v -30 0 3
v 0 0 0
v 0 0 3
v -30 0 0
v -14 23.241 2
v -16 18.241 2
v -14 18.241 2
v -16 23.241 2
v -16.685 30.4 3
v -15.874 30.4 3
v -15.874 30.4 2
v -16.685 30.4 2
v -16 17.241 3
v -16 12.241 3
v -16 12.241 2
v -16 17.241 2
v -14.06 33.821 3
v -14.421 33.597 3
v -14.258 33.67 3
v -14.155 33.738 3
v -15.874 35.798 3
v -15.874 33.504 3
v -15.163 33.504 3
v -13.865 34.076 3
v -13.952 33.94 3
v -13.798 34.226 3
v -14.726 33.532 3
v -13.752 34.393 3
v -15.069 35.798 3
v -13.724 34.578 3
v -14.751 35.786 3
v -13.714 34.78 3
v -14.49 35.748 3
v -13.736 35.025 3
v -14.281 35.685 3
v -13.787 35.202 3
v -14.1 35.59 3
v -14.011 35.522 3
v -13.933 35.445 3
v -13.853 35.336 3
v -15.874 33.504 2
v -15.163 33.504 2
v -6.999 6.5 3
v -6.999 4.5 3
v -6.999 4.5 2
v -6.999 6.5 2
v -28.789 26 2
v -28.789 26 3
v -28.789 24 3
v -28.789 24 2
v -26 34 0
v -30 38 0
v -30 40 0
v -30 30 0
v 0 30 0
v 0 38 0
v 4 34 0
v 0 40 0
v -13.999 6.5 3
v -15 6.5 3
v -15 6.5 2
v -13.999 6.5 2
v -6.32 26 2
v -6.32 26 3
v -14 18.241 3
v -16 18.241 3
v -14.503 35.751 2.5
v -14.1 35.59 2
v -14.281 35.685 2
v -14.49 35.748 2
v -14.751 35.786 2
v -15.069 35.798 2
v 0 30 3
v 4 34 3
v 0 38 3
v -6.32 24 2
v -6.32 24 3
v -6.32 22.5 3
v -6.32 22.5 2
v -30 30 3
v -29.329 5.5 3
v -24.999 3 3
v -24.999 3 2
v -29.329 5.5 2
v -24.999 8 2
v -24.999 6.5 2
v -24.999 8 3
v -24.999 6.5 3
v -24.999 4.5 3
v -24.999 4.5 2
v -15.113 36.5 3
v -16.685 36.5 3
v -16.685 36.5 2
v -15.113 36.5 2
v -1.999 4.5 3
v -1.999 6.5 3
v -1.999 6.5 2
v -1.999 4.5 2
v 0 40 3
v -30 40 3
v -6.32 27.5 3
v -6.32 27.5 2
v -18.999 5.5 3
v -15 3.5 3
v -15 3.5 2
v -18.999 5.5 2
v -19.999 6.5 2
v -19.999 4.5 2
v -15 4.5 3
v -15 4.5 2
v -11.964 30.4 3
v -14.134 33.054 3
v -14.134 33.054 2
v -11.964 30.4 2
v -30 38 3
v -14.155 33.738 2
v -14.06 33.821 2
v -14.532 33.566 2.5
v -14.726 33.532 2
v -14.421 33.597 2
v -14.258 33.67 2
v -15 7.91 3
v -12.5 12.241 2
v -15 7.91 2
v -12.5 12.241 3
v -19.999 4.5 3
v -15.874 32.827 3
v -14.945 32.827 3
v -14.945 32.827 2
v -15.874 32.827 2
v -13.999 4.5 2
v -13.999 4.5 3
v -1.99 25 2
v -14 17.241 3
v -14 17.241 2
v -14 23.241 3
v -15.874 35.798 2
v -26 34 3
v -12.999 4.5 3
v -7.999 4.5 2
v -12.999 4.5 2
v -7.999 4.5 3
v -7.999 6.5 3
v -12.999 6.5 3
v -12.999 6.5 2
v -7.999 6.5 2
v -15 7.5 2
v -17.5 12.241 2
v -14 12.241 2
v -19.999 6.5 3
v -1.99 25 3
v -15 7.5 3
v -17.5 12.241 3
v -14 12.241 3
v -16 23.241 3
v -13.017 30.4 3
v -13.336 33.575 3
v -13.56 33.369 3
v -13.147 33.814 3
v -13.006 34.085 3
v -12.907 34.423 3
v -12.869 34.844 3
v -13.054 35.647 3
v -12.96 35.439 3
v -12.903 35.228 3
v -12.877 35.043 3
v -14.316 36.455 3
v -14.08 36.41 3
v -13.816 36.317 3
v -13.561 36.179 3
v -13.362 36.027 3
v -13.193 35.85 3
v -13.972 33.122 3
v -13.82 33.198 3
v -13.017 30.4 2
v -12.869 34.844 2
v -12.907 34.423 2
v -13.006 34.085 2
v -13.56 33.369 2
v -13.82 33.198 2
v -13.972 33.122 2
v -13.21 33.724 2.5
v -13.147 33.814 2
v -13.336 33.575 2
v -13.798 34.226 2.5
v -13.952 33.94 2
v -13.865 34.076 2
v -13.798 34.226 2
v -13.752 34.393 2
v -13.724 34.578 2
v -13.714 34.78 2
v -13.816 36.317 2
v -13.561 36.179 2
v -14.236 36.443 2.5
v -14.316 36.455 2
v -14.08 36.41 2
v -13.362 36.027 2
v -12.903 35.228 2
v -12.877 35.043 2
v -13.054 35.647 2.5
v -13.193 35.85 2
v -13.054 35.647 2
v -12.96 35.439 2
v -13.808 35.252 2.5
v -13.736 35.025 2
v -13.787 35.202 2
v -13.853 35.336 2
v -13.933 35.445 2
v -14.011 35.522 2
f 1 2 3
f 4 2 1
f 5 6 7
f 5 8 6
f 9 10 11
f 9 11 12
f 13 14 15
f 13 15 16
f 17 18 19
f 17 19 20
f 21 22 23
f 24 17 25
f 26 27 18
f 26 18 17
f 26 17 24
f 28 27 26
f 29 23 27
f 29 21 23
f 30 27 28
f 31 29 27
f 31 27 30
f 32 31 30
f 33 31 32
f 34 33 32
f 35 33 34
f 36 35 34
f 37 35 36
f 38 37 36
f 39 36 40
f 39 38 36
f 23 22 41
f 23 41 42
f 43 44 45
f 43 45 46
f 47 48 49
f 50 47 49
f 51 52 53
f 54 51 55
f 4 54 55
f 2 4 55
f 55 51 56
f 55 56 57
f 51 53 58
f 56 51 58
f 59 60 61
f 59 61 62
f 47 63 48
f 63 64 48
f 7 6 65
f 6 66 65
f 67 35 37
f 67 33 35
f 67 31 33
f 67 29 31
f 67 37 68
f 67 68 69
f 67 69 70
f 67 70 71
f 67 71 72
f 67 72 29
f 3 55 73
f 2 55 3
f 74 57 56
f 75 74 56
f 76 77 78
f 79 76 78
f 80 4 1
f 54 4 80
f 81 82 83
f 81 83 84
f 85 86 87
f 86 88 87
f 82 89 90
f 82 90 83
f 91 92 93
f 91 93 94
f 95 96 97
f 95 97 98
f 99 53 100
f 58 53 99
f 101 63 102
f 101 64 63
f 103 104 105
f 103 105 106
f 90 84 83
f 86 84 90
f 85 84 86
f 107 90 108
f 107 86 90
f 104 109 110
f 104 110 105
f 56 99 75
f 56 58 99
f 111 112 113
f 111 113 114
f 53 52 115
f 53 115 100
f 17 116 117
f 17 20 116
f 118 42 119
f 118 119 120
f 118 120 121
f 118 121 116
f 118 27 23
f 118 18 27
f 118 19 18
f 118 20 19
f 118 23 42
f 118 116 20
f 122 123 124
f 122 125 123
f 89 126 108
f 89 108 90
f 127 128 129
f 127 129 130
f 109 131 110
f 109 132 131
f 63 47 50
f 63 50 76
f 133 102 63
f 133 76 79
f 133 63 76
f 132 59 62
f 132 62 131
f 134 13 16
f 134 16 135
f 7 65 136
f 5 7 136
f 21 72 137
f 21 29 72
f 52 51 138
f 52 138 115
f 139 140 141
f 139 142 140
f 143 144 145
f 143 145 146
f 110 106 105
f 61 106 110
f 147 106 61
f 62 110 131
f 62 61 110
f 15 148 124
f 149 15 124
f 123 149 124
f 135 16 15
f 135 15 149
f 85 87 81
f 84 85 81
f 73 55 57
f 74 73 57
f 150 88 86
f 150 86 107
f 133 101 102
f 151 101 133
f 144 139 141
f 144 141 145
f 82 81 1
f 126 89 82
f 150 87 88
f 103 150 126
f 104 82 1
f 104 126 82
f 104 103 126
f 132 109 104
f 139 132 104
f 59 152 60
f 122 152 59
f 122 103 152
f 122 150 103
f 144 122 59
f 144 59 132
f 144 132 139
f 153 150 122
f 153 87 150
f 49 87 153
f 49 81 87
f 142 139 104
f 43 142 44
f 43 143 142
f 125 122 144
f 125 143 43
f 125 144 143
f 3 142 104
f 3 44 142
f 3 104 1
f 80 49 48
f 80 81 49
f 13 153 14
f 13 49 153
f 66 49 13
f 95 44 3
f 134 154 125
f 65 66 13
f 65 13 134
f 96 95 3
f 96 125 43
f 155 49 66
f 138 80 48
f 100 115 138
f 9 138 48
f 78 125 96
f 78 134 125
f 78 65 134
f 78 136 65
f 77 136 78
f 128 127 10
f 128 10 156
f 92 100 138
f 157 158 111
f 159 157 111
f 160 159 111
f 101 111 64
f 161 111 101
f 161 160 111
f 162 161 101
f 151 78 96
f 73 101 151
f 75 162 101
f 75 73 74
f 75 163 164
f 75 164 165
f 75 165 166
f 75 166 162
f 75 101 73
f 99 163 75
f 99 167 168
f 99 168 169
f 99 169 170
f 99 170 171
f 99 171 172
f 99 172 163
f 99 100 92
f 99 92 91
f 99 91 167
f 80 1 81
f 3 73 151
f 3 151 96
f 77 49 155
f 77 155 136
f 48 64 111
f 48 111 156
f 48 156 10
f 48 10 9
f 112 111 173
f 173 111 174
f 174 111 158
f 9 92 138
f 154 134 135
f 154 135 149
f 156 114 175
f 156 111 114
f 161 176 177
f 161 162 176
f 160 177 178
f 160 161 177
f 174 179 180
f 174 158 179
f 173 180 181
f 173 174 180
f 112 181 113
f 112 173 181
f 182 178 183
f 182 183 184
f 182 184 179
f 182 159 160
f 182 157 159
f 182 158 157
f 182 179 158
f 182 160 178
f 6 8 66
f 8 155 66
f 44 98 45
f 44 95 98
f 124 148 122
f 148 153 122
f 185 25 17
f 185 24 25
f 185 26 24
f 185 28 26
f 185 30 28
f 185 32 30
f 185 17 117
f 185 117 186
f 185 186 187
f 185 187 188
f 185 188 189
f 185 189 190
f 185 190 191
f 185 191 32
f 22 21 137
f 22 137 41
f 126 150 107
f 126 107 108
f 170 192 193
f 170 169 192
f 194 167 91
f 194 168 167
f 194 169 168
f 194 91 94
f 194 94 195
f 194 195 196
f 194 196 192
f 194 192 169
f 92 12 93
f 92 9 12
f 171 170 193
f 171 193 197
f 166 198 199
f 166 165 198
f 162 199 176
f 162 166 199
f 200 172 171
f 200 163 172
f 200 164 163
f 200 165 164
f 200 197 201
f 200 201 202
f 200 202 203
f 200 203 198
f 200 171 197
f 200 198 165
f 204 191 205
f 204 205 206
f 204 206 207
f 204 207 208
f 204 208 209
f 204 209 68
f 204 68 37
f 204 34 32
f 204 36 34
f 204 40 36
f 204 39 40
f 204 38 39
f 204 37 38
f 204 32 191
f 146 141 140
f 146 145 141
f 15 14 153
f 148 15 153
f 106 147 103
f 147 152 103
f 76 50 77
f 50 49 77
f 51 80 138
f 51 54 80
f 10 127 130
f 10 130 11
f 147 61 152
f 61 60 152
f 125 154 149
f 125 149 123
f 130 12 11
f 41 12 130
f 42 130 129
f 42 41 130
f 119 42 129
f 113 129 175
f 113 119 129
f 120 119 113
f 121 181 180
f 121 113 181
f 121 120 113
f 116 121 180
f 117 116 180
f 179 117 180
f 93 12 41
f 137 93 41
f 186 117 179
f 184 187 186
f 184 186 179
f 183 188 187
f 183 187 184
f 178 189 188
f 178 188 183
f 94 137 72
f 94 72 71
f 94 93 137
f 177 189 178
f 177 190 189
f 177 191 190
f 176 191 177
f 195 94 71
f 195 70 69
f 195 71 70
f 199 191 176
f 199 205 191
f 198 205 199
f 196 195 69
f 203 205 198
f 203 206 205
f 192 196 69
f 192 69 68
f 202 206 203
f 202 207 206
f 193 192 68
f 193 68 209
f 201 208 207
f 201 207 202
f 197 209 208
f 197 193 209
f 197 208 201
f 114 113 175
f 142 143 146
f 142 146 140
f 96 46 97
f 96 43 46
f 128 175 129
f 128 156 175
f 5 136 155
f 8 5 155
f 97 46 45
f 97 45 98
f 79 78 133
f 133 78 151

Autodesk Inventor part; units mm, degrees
ref_plane "YZ Plane" through (0, 0, 0) normal (1, 0, 0) x (0, 1, 0)
ref_plane "XZ Plane" through (0, 0, 0) normal (0, 1, 0) x (-1, 0, 0)
ref_plane "XY Plane" through (0, 0, 0) normal (0, 0, 1) x (1, 0, 0)
sketch "Sketch1" plane through (0, 0, 0) normal (0, 0, 1) x (1, 0, 0)
  line L0 (0, 0) -> (-30, 0)
  line L1 (-30, 40) -> (0, 40)
  line L2 (-36.1318, 34) -> (13.8682, 34) construction
  circle A0 centre (0, 34) radius 4 construction
  circle A1 centre (-30, 34) radius 4 construction
  line L3 (-30, 30) -> (0, 30) construction
  line L4 (0, 30) -> (4, 34)
  line L5 (4, 34) -> (0, 38)
  line L6 (-30, 30) -> (-26, 34)
  line L7 (-26, 34) -> (-30, 38)
  line L8 (-30, 0) -> (-30, 30)
  line L9 (-30, 38) -> (-30, 40)
  line L10 (0, 40) -> (0, 38)
  line L11 (0, 30) -> (0, 0)
  dimension "d0" = 30
  dimension "d1" = 40
  dimension "d2" = 50
  dimension "d3" = 6
  dimension "d4" = 8
  dimension "d5" = 8
extrude "Extrusion1" add sketch "Sketch1" along normal blind 3
sketch "Sketch2" plane through (0, 0, 3) normal (0, 0, 1) x (1, 0, 0)
  line L0 (-30, 30) -> (-30, 0) construction
  line L1 (-30, 0) -> (0, 0) construction
  line L2 (0, 0) -> (0, 30) construction
  line L3 (-17.303, 36.5) -> (-11.9002, 36.5) construction
  line L4 (-11.9002, 36.5) -> (-11.9002, 30.2072) construction
  line L5 (-11.9002, 30.2072) -> (-17.303, 30.2072) construction
  line L6 (-17.303, 30.2072) -> (-17.303, 36.5) construction
  line L7 (-28.7886, 24) -> (-6.3197, 24)
  line L8 (-6.3197, 24) -> (-6.3197, 26)
  line L9 (-6.3197, 26) -> (-28.7886, 26)
  line L10 (-30, 25) -> (0, 25) construction
  line L11 (-6.3197, 26) -> (-6.3197, 27.5)
  line L12 (-6.3197, 27.5) -> (-1.9896, 25)
  line L13 (-6.3197, 24) -> (-6.3197, 22.5)
  line L14 (-6.3197, 22.5) -> (-1.9896, 25)
  line L15 (-16, 12.2406) -> (-17.5, 12.2406)
  line L16 (-17.5, 12.2406) -> (-15, 7.9105)
  line L17 (-14, 12.2406) -> (-12.5, 12.2406)
  line L18 (-12.5, 12.2406) -> (-15, 7.9105)
  line L19 (-30, 5.5) -> (0, 5.5) construction
  line L20 (-6.9986, 6.5) -> (-1.9986, 6.5)
  line L21 (-1.9986, 6.5) -> (-1.9986, 4.5)
  line L22 (-1.9986, 4.5) -> (-6.9986, 4.5)
  line L23 (-6.9986, 4.5) -> (-6.9986, 6.5)
  line L24 (-6.9986, 6.5) -> (-1.9986, 4.5) construction
  line L25 (-1.9986, 6.5) -> (-6.9986, 4.5) construction
  line L26 (-1.9896, 25) -> (-1.9896, 0) construction
  line L27 (-12.9986, 6.5) -> (-7.9986, 6.5)
  line L28 (-36, 5.5) -> (-6, 5.5) construction
  line L29 (-7.9986, 4.5) -> (-12.9986, 4.5)
  line L30 (-12.9986, 4.5) -> (-12.9986, 6.5)
  line L31 (-7.9986, 6.5) -> (-7.9986, 4.5)
  line L32 (-18.9986, 6.5) -> (-13.9986, 6.5)
  line L33 (-42, 5.5) -> (-12, 5.5) construction
  line L34 (-13.9986, 4.5) -> (-18.9986, 4.5)
  line L35 (-18.9986, 4.5) -> (-18.9986, 5.4478)
  line L36 (-13.9986, 6.5) -> (-13.9986, 4.5)
  line L37 (-24.9986, 6.5) -> (-19.9986, 6.5)
  line L38 (-48, 5.5) -> (-18, 5.5) construction
  line L39 (-19.9986, 4.5) -> (-24.9986, 4.5)
  line L40 (-24.9986, 4.5) -> (-24.9986, 6.5)
  line L41 (-19.9986, 6.5) -> (-19.9986, 4.5)
  line L42 (-24.9986, 6.5) -> (-24.9986, 8)
  line L43 (-24.9986, 8) -> (-29.3287, 5.5)
  line L44 (-24.9986, 4.5) -> (-24.9986, 3)
  line L45 (-24.9986, 3) -> (-29.3287, 5.5)
  line L46 (-28.7886, 26) -> (-28.7886, 24)
  line L47 (-15, 6.5) -> (-15, 7.5)
  line L48 (-15, 7.5) -> (-18.9986, 5.5)
  line L49 (-15, 4.5) -> (-15, 3.5)
  line L50 (-15, 3.5) -> (-18.9986, 5.5)
  line L51 (-15, 6.5) -> (-13.9986, 6.5)
  line L52 (-13.9986, 6.5) -> (-13.9986, 4.5)
  line L53 (-13.9986, 4.5) -> (-15, 4.5)
  line L54 (-15, -0.4455) -> (-15, 27.9265) construction
  line L55 (-16, 12.2406) -> (-16, 17.2406)
  line L56 (-14, 17.2406) -> (-14, 12.2406)
  line L57 (-16, 18.2406) -> (-14, 18.2406)
  line L58 (-14, 18.2406) -> (-14, 23.2406)
  line L59 (-14, 23.2406) -> (-16, 23.2406)
  line L60 (-16, 23.2406) -> (-16, 18.2406)
  line L61 (-16, 17.2406) -> (-14, 17.2406)
  line L62 (0, 40) -> (-30, 40) construction
  line L63 (-11.9643, 30.4) -> (-13.0172, 30.4)
  line L64 (-13.0172, 30.4) -> (-14.9451, 32.8271)
  line L65 (-14.9451, 32.8271) -> (-15.8744, 32.8271)
  line L66 (-15.8744, 32.8271) -> (-15.8744, 30.4)
  line L67 (-15.8744, 30.4) -> (-16.6851, 30.4)
  line L68 (-16.6851, 30.4) -> (-16.6851, 36.5)
  line L69 (-16.6851, 36.5) -> (-15.1132, 36.5)
  spline S0 degree 2 poles (-15.1132, 36.5) (-14.5892, 36.5) (-13.8823, 36.3863) (-13.561, 36.1787) knots 0 0 0 1 2 2 2
  spline S1 degree 2 poles (-13.561, 36.1787) (-13.2397, 35.9711) (-12.8689, 35.3235) (-12.8689, 34.844) knots 0 0 0 1 2 2 2
  spline S2 degree 2 poles (-12.8689, 34.844) (-12.8689, 34.1767) (-13.5511, 33.272) (-14.1344, 33.0545) knots 0 0 0 1 2 2 2
  line L70 (-14.1344, 33.0545) -> (-11.9643, 30.4)
  spline S3 degree 2 poles (-13.7142, 34.7797) (-13.7142, 35.0467) (-13.9021, 35.457) (-14.0998, 35.5904) knots 0 0 0 1 2 2 2
  spline S4 degree 2 poles (-14.0998, 35.5904) (-14.2728, 35.7041) (-14.7325, 35.7981) (-15.0687, 35.7981) knots 0 0 0 1 2 2 2
  line L71 (-15.0687, 35.7981) -> (-15.8744, 35.7981)
  line L72 (-15.8744, 35.7981) -> (-15.8744, 33.5044)
  line L73 (-15.8744, 33.5044) -> (-15.1626, 33.5044)
  spline S5 degree 2 poles (-15.1626, 33.5044) (-14.8116, 33.5044) (-14.253, 33.628) (-14.0602, 33.8207) knots 0 0 0 1 2 2 2
  spline S6 degree 2 poles (-14.0602, 33.8207) (-13.8823, 33.9888) (-13.7142, 34.4634) (-13.7142, 34.7797) knots 0 0 0 1 2 2 2
  point P0 (-30, 24.9574)
  point P1 (-4.4986, 5.5)
  point P2 (-10.4986, 5.5)
  point P3 (-16.4986, 5.5)
  point P4 (-22.4986, 5.5)
  point P5 (-15, 7.9105)
  point P6 (-15, 18.2406)
  point P7 (-15, 40)
  dimension "d18" = 1.5
  dimension "d19" = 5
  dimension "d20" = 1.5
  dimension "d21" = 1.5
  dimension "d22" = 5
  dimension "d23" = 1.5
  dimension "d24" = 5
  dimension "d25" = 2
  dimension "d28" = 6
  dimension "d33" = 1.5
  dimension "d34" = 5
  dimension "d35" = 1.5
  dimension "d38" = 1
  dimension "d39" = 1
  dimension "d40" = 25
  dimension "d41" = 1
  dimension "d42" = 1
  dimension "d43" = 5
  dimension "d44" = 2
  dimension "d45" = 5
  dimension "d47" = 1
  dimension "d48" = 8
  dimension "d49" = 3.5
extrude "Extrusion2" cut sketch "Sketch2" against normal blind 1
properties part number "MS_R[202] text"
